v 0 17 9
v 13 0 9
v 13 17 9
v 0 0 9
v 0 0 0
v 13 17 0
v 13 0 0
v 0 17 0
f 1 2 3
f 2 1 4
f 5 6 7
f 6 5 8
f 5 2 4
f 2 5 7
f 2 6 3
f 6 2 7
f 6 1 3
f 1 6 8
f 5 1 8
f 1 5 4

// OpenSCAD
// Generated by SolidPython 1.0.1 on 2020-07-29 00:46:55


cube(size = [13, 17, 9]);
/***********************************************
*********      SolidPython code:      **********
************************************************
 
# import packages: SolidPython
from solid import *
from solid.utils import *
from itertools import chain, combinations, permutations


class Resize:

    def __init__(self, scad_file):
        self.scad_file = scad_file
        #self.scad_file = import_scad(scad_file)
        # cone/cylinder param:
        self.r1 = 0
        self.r2 = 0
        self.h = 0
        # rectangular prism param:
        self.w = 0
        self.l = 0
        # ellipse param:
        self.r = 0

    # import OpenScad code (file name corresponds to shape)


    # classify shape + parameters
    def assign(self, param1, param2, param3):
        if self.scad_file == 'cone.scad':
            self.r1 = param1
            self.r2 = param2
            self.h = param3
        elif self.scad_file == 'cylinder.scad':
            self.r1 = param1
            self.r2 = param2
            self.h = param3
        elif self.scad_file == 'rectangularPrism.scad':
            self.h = param1
            self.l = param2
            self.w = param3
        else:
            self.r = param1
            self.h = param2

    # resize parameters
    def iterate(self):
        x = range(3, 20, 2)
        i = 1
        if self.scad_file == 'cone.scad':
            tempList = list(permutations(x, 2))
            for temp in tempList:
                param1 = temp[0]
                param2 = temp[1]
                filepath = 'produced_scad_files/' + 'cone' + str(param1) + '_' + str(param2) + '_' + '.scad'
                scad_render_to_file(cylinder(h=param1, r1=param2, r2=0), filepath)

        elif self.scad_file == 'cylinder.scad':
            tempList = list(permutations(x, 3))
            for temp in tempList:
                param1 = temp[0]
                param2 = temp[1]
                filepath = 'produced_scad_files/' + 'cylinder' + str(param1) + '_' + str(param2) + '_' + '.scad'
                scad_render_to_file(cylinder(h=param1, r1=param2, r2=param2), filepath)

        elif self.scad_file == 'rectangularPrism.scad':
            tempList = list(permutations(x, 3))
            for temp in tempList:
                param1 = temp[0]
                param2 = temp[1]
                param3 = temp[2]
                filepath = 'produced_scad_files/' + 'rectangularPrism' + str(param1) + '_' + str(param2) + '_' + str(
                    param3) + '.scad'
                scad_render_to_file(cube(size=(param1, param2, param3)), filepath)

        elif self.scad_file == 'ellipse.scad':
            tempList = list(permutations(x, 4))
            for temp in tempList:
                param1 = temp[0]
                param2 = temp[1]
                param3 = temp[2]
                param4 = temp[3]
                filepath = 'produced_scad_files/' + 'ellipse' + str(param1) + '_' + str(param2) + '_' + str(param3) + '_' + str(param4) + '.scad'
                scad_render_to_file(scale([param1, param2, param3])(sphere(r=param4)), filepath)

    def render_to_scadfile(self):
        scad_render_to_file(scad, 'example.scad') 
 
************************************************/
